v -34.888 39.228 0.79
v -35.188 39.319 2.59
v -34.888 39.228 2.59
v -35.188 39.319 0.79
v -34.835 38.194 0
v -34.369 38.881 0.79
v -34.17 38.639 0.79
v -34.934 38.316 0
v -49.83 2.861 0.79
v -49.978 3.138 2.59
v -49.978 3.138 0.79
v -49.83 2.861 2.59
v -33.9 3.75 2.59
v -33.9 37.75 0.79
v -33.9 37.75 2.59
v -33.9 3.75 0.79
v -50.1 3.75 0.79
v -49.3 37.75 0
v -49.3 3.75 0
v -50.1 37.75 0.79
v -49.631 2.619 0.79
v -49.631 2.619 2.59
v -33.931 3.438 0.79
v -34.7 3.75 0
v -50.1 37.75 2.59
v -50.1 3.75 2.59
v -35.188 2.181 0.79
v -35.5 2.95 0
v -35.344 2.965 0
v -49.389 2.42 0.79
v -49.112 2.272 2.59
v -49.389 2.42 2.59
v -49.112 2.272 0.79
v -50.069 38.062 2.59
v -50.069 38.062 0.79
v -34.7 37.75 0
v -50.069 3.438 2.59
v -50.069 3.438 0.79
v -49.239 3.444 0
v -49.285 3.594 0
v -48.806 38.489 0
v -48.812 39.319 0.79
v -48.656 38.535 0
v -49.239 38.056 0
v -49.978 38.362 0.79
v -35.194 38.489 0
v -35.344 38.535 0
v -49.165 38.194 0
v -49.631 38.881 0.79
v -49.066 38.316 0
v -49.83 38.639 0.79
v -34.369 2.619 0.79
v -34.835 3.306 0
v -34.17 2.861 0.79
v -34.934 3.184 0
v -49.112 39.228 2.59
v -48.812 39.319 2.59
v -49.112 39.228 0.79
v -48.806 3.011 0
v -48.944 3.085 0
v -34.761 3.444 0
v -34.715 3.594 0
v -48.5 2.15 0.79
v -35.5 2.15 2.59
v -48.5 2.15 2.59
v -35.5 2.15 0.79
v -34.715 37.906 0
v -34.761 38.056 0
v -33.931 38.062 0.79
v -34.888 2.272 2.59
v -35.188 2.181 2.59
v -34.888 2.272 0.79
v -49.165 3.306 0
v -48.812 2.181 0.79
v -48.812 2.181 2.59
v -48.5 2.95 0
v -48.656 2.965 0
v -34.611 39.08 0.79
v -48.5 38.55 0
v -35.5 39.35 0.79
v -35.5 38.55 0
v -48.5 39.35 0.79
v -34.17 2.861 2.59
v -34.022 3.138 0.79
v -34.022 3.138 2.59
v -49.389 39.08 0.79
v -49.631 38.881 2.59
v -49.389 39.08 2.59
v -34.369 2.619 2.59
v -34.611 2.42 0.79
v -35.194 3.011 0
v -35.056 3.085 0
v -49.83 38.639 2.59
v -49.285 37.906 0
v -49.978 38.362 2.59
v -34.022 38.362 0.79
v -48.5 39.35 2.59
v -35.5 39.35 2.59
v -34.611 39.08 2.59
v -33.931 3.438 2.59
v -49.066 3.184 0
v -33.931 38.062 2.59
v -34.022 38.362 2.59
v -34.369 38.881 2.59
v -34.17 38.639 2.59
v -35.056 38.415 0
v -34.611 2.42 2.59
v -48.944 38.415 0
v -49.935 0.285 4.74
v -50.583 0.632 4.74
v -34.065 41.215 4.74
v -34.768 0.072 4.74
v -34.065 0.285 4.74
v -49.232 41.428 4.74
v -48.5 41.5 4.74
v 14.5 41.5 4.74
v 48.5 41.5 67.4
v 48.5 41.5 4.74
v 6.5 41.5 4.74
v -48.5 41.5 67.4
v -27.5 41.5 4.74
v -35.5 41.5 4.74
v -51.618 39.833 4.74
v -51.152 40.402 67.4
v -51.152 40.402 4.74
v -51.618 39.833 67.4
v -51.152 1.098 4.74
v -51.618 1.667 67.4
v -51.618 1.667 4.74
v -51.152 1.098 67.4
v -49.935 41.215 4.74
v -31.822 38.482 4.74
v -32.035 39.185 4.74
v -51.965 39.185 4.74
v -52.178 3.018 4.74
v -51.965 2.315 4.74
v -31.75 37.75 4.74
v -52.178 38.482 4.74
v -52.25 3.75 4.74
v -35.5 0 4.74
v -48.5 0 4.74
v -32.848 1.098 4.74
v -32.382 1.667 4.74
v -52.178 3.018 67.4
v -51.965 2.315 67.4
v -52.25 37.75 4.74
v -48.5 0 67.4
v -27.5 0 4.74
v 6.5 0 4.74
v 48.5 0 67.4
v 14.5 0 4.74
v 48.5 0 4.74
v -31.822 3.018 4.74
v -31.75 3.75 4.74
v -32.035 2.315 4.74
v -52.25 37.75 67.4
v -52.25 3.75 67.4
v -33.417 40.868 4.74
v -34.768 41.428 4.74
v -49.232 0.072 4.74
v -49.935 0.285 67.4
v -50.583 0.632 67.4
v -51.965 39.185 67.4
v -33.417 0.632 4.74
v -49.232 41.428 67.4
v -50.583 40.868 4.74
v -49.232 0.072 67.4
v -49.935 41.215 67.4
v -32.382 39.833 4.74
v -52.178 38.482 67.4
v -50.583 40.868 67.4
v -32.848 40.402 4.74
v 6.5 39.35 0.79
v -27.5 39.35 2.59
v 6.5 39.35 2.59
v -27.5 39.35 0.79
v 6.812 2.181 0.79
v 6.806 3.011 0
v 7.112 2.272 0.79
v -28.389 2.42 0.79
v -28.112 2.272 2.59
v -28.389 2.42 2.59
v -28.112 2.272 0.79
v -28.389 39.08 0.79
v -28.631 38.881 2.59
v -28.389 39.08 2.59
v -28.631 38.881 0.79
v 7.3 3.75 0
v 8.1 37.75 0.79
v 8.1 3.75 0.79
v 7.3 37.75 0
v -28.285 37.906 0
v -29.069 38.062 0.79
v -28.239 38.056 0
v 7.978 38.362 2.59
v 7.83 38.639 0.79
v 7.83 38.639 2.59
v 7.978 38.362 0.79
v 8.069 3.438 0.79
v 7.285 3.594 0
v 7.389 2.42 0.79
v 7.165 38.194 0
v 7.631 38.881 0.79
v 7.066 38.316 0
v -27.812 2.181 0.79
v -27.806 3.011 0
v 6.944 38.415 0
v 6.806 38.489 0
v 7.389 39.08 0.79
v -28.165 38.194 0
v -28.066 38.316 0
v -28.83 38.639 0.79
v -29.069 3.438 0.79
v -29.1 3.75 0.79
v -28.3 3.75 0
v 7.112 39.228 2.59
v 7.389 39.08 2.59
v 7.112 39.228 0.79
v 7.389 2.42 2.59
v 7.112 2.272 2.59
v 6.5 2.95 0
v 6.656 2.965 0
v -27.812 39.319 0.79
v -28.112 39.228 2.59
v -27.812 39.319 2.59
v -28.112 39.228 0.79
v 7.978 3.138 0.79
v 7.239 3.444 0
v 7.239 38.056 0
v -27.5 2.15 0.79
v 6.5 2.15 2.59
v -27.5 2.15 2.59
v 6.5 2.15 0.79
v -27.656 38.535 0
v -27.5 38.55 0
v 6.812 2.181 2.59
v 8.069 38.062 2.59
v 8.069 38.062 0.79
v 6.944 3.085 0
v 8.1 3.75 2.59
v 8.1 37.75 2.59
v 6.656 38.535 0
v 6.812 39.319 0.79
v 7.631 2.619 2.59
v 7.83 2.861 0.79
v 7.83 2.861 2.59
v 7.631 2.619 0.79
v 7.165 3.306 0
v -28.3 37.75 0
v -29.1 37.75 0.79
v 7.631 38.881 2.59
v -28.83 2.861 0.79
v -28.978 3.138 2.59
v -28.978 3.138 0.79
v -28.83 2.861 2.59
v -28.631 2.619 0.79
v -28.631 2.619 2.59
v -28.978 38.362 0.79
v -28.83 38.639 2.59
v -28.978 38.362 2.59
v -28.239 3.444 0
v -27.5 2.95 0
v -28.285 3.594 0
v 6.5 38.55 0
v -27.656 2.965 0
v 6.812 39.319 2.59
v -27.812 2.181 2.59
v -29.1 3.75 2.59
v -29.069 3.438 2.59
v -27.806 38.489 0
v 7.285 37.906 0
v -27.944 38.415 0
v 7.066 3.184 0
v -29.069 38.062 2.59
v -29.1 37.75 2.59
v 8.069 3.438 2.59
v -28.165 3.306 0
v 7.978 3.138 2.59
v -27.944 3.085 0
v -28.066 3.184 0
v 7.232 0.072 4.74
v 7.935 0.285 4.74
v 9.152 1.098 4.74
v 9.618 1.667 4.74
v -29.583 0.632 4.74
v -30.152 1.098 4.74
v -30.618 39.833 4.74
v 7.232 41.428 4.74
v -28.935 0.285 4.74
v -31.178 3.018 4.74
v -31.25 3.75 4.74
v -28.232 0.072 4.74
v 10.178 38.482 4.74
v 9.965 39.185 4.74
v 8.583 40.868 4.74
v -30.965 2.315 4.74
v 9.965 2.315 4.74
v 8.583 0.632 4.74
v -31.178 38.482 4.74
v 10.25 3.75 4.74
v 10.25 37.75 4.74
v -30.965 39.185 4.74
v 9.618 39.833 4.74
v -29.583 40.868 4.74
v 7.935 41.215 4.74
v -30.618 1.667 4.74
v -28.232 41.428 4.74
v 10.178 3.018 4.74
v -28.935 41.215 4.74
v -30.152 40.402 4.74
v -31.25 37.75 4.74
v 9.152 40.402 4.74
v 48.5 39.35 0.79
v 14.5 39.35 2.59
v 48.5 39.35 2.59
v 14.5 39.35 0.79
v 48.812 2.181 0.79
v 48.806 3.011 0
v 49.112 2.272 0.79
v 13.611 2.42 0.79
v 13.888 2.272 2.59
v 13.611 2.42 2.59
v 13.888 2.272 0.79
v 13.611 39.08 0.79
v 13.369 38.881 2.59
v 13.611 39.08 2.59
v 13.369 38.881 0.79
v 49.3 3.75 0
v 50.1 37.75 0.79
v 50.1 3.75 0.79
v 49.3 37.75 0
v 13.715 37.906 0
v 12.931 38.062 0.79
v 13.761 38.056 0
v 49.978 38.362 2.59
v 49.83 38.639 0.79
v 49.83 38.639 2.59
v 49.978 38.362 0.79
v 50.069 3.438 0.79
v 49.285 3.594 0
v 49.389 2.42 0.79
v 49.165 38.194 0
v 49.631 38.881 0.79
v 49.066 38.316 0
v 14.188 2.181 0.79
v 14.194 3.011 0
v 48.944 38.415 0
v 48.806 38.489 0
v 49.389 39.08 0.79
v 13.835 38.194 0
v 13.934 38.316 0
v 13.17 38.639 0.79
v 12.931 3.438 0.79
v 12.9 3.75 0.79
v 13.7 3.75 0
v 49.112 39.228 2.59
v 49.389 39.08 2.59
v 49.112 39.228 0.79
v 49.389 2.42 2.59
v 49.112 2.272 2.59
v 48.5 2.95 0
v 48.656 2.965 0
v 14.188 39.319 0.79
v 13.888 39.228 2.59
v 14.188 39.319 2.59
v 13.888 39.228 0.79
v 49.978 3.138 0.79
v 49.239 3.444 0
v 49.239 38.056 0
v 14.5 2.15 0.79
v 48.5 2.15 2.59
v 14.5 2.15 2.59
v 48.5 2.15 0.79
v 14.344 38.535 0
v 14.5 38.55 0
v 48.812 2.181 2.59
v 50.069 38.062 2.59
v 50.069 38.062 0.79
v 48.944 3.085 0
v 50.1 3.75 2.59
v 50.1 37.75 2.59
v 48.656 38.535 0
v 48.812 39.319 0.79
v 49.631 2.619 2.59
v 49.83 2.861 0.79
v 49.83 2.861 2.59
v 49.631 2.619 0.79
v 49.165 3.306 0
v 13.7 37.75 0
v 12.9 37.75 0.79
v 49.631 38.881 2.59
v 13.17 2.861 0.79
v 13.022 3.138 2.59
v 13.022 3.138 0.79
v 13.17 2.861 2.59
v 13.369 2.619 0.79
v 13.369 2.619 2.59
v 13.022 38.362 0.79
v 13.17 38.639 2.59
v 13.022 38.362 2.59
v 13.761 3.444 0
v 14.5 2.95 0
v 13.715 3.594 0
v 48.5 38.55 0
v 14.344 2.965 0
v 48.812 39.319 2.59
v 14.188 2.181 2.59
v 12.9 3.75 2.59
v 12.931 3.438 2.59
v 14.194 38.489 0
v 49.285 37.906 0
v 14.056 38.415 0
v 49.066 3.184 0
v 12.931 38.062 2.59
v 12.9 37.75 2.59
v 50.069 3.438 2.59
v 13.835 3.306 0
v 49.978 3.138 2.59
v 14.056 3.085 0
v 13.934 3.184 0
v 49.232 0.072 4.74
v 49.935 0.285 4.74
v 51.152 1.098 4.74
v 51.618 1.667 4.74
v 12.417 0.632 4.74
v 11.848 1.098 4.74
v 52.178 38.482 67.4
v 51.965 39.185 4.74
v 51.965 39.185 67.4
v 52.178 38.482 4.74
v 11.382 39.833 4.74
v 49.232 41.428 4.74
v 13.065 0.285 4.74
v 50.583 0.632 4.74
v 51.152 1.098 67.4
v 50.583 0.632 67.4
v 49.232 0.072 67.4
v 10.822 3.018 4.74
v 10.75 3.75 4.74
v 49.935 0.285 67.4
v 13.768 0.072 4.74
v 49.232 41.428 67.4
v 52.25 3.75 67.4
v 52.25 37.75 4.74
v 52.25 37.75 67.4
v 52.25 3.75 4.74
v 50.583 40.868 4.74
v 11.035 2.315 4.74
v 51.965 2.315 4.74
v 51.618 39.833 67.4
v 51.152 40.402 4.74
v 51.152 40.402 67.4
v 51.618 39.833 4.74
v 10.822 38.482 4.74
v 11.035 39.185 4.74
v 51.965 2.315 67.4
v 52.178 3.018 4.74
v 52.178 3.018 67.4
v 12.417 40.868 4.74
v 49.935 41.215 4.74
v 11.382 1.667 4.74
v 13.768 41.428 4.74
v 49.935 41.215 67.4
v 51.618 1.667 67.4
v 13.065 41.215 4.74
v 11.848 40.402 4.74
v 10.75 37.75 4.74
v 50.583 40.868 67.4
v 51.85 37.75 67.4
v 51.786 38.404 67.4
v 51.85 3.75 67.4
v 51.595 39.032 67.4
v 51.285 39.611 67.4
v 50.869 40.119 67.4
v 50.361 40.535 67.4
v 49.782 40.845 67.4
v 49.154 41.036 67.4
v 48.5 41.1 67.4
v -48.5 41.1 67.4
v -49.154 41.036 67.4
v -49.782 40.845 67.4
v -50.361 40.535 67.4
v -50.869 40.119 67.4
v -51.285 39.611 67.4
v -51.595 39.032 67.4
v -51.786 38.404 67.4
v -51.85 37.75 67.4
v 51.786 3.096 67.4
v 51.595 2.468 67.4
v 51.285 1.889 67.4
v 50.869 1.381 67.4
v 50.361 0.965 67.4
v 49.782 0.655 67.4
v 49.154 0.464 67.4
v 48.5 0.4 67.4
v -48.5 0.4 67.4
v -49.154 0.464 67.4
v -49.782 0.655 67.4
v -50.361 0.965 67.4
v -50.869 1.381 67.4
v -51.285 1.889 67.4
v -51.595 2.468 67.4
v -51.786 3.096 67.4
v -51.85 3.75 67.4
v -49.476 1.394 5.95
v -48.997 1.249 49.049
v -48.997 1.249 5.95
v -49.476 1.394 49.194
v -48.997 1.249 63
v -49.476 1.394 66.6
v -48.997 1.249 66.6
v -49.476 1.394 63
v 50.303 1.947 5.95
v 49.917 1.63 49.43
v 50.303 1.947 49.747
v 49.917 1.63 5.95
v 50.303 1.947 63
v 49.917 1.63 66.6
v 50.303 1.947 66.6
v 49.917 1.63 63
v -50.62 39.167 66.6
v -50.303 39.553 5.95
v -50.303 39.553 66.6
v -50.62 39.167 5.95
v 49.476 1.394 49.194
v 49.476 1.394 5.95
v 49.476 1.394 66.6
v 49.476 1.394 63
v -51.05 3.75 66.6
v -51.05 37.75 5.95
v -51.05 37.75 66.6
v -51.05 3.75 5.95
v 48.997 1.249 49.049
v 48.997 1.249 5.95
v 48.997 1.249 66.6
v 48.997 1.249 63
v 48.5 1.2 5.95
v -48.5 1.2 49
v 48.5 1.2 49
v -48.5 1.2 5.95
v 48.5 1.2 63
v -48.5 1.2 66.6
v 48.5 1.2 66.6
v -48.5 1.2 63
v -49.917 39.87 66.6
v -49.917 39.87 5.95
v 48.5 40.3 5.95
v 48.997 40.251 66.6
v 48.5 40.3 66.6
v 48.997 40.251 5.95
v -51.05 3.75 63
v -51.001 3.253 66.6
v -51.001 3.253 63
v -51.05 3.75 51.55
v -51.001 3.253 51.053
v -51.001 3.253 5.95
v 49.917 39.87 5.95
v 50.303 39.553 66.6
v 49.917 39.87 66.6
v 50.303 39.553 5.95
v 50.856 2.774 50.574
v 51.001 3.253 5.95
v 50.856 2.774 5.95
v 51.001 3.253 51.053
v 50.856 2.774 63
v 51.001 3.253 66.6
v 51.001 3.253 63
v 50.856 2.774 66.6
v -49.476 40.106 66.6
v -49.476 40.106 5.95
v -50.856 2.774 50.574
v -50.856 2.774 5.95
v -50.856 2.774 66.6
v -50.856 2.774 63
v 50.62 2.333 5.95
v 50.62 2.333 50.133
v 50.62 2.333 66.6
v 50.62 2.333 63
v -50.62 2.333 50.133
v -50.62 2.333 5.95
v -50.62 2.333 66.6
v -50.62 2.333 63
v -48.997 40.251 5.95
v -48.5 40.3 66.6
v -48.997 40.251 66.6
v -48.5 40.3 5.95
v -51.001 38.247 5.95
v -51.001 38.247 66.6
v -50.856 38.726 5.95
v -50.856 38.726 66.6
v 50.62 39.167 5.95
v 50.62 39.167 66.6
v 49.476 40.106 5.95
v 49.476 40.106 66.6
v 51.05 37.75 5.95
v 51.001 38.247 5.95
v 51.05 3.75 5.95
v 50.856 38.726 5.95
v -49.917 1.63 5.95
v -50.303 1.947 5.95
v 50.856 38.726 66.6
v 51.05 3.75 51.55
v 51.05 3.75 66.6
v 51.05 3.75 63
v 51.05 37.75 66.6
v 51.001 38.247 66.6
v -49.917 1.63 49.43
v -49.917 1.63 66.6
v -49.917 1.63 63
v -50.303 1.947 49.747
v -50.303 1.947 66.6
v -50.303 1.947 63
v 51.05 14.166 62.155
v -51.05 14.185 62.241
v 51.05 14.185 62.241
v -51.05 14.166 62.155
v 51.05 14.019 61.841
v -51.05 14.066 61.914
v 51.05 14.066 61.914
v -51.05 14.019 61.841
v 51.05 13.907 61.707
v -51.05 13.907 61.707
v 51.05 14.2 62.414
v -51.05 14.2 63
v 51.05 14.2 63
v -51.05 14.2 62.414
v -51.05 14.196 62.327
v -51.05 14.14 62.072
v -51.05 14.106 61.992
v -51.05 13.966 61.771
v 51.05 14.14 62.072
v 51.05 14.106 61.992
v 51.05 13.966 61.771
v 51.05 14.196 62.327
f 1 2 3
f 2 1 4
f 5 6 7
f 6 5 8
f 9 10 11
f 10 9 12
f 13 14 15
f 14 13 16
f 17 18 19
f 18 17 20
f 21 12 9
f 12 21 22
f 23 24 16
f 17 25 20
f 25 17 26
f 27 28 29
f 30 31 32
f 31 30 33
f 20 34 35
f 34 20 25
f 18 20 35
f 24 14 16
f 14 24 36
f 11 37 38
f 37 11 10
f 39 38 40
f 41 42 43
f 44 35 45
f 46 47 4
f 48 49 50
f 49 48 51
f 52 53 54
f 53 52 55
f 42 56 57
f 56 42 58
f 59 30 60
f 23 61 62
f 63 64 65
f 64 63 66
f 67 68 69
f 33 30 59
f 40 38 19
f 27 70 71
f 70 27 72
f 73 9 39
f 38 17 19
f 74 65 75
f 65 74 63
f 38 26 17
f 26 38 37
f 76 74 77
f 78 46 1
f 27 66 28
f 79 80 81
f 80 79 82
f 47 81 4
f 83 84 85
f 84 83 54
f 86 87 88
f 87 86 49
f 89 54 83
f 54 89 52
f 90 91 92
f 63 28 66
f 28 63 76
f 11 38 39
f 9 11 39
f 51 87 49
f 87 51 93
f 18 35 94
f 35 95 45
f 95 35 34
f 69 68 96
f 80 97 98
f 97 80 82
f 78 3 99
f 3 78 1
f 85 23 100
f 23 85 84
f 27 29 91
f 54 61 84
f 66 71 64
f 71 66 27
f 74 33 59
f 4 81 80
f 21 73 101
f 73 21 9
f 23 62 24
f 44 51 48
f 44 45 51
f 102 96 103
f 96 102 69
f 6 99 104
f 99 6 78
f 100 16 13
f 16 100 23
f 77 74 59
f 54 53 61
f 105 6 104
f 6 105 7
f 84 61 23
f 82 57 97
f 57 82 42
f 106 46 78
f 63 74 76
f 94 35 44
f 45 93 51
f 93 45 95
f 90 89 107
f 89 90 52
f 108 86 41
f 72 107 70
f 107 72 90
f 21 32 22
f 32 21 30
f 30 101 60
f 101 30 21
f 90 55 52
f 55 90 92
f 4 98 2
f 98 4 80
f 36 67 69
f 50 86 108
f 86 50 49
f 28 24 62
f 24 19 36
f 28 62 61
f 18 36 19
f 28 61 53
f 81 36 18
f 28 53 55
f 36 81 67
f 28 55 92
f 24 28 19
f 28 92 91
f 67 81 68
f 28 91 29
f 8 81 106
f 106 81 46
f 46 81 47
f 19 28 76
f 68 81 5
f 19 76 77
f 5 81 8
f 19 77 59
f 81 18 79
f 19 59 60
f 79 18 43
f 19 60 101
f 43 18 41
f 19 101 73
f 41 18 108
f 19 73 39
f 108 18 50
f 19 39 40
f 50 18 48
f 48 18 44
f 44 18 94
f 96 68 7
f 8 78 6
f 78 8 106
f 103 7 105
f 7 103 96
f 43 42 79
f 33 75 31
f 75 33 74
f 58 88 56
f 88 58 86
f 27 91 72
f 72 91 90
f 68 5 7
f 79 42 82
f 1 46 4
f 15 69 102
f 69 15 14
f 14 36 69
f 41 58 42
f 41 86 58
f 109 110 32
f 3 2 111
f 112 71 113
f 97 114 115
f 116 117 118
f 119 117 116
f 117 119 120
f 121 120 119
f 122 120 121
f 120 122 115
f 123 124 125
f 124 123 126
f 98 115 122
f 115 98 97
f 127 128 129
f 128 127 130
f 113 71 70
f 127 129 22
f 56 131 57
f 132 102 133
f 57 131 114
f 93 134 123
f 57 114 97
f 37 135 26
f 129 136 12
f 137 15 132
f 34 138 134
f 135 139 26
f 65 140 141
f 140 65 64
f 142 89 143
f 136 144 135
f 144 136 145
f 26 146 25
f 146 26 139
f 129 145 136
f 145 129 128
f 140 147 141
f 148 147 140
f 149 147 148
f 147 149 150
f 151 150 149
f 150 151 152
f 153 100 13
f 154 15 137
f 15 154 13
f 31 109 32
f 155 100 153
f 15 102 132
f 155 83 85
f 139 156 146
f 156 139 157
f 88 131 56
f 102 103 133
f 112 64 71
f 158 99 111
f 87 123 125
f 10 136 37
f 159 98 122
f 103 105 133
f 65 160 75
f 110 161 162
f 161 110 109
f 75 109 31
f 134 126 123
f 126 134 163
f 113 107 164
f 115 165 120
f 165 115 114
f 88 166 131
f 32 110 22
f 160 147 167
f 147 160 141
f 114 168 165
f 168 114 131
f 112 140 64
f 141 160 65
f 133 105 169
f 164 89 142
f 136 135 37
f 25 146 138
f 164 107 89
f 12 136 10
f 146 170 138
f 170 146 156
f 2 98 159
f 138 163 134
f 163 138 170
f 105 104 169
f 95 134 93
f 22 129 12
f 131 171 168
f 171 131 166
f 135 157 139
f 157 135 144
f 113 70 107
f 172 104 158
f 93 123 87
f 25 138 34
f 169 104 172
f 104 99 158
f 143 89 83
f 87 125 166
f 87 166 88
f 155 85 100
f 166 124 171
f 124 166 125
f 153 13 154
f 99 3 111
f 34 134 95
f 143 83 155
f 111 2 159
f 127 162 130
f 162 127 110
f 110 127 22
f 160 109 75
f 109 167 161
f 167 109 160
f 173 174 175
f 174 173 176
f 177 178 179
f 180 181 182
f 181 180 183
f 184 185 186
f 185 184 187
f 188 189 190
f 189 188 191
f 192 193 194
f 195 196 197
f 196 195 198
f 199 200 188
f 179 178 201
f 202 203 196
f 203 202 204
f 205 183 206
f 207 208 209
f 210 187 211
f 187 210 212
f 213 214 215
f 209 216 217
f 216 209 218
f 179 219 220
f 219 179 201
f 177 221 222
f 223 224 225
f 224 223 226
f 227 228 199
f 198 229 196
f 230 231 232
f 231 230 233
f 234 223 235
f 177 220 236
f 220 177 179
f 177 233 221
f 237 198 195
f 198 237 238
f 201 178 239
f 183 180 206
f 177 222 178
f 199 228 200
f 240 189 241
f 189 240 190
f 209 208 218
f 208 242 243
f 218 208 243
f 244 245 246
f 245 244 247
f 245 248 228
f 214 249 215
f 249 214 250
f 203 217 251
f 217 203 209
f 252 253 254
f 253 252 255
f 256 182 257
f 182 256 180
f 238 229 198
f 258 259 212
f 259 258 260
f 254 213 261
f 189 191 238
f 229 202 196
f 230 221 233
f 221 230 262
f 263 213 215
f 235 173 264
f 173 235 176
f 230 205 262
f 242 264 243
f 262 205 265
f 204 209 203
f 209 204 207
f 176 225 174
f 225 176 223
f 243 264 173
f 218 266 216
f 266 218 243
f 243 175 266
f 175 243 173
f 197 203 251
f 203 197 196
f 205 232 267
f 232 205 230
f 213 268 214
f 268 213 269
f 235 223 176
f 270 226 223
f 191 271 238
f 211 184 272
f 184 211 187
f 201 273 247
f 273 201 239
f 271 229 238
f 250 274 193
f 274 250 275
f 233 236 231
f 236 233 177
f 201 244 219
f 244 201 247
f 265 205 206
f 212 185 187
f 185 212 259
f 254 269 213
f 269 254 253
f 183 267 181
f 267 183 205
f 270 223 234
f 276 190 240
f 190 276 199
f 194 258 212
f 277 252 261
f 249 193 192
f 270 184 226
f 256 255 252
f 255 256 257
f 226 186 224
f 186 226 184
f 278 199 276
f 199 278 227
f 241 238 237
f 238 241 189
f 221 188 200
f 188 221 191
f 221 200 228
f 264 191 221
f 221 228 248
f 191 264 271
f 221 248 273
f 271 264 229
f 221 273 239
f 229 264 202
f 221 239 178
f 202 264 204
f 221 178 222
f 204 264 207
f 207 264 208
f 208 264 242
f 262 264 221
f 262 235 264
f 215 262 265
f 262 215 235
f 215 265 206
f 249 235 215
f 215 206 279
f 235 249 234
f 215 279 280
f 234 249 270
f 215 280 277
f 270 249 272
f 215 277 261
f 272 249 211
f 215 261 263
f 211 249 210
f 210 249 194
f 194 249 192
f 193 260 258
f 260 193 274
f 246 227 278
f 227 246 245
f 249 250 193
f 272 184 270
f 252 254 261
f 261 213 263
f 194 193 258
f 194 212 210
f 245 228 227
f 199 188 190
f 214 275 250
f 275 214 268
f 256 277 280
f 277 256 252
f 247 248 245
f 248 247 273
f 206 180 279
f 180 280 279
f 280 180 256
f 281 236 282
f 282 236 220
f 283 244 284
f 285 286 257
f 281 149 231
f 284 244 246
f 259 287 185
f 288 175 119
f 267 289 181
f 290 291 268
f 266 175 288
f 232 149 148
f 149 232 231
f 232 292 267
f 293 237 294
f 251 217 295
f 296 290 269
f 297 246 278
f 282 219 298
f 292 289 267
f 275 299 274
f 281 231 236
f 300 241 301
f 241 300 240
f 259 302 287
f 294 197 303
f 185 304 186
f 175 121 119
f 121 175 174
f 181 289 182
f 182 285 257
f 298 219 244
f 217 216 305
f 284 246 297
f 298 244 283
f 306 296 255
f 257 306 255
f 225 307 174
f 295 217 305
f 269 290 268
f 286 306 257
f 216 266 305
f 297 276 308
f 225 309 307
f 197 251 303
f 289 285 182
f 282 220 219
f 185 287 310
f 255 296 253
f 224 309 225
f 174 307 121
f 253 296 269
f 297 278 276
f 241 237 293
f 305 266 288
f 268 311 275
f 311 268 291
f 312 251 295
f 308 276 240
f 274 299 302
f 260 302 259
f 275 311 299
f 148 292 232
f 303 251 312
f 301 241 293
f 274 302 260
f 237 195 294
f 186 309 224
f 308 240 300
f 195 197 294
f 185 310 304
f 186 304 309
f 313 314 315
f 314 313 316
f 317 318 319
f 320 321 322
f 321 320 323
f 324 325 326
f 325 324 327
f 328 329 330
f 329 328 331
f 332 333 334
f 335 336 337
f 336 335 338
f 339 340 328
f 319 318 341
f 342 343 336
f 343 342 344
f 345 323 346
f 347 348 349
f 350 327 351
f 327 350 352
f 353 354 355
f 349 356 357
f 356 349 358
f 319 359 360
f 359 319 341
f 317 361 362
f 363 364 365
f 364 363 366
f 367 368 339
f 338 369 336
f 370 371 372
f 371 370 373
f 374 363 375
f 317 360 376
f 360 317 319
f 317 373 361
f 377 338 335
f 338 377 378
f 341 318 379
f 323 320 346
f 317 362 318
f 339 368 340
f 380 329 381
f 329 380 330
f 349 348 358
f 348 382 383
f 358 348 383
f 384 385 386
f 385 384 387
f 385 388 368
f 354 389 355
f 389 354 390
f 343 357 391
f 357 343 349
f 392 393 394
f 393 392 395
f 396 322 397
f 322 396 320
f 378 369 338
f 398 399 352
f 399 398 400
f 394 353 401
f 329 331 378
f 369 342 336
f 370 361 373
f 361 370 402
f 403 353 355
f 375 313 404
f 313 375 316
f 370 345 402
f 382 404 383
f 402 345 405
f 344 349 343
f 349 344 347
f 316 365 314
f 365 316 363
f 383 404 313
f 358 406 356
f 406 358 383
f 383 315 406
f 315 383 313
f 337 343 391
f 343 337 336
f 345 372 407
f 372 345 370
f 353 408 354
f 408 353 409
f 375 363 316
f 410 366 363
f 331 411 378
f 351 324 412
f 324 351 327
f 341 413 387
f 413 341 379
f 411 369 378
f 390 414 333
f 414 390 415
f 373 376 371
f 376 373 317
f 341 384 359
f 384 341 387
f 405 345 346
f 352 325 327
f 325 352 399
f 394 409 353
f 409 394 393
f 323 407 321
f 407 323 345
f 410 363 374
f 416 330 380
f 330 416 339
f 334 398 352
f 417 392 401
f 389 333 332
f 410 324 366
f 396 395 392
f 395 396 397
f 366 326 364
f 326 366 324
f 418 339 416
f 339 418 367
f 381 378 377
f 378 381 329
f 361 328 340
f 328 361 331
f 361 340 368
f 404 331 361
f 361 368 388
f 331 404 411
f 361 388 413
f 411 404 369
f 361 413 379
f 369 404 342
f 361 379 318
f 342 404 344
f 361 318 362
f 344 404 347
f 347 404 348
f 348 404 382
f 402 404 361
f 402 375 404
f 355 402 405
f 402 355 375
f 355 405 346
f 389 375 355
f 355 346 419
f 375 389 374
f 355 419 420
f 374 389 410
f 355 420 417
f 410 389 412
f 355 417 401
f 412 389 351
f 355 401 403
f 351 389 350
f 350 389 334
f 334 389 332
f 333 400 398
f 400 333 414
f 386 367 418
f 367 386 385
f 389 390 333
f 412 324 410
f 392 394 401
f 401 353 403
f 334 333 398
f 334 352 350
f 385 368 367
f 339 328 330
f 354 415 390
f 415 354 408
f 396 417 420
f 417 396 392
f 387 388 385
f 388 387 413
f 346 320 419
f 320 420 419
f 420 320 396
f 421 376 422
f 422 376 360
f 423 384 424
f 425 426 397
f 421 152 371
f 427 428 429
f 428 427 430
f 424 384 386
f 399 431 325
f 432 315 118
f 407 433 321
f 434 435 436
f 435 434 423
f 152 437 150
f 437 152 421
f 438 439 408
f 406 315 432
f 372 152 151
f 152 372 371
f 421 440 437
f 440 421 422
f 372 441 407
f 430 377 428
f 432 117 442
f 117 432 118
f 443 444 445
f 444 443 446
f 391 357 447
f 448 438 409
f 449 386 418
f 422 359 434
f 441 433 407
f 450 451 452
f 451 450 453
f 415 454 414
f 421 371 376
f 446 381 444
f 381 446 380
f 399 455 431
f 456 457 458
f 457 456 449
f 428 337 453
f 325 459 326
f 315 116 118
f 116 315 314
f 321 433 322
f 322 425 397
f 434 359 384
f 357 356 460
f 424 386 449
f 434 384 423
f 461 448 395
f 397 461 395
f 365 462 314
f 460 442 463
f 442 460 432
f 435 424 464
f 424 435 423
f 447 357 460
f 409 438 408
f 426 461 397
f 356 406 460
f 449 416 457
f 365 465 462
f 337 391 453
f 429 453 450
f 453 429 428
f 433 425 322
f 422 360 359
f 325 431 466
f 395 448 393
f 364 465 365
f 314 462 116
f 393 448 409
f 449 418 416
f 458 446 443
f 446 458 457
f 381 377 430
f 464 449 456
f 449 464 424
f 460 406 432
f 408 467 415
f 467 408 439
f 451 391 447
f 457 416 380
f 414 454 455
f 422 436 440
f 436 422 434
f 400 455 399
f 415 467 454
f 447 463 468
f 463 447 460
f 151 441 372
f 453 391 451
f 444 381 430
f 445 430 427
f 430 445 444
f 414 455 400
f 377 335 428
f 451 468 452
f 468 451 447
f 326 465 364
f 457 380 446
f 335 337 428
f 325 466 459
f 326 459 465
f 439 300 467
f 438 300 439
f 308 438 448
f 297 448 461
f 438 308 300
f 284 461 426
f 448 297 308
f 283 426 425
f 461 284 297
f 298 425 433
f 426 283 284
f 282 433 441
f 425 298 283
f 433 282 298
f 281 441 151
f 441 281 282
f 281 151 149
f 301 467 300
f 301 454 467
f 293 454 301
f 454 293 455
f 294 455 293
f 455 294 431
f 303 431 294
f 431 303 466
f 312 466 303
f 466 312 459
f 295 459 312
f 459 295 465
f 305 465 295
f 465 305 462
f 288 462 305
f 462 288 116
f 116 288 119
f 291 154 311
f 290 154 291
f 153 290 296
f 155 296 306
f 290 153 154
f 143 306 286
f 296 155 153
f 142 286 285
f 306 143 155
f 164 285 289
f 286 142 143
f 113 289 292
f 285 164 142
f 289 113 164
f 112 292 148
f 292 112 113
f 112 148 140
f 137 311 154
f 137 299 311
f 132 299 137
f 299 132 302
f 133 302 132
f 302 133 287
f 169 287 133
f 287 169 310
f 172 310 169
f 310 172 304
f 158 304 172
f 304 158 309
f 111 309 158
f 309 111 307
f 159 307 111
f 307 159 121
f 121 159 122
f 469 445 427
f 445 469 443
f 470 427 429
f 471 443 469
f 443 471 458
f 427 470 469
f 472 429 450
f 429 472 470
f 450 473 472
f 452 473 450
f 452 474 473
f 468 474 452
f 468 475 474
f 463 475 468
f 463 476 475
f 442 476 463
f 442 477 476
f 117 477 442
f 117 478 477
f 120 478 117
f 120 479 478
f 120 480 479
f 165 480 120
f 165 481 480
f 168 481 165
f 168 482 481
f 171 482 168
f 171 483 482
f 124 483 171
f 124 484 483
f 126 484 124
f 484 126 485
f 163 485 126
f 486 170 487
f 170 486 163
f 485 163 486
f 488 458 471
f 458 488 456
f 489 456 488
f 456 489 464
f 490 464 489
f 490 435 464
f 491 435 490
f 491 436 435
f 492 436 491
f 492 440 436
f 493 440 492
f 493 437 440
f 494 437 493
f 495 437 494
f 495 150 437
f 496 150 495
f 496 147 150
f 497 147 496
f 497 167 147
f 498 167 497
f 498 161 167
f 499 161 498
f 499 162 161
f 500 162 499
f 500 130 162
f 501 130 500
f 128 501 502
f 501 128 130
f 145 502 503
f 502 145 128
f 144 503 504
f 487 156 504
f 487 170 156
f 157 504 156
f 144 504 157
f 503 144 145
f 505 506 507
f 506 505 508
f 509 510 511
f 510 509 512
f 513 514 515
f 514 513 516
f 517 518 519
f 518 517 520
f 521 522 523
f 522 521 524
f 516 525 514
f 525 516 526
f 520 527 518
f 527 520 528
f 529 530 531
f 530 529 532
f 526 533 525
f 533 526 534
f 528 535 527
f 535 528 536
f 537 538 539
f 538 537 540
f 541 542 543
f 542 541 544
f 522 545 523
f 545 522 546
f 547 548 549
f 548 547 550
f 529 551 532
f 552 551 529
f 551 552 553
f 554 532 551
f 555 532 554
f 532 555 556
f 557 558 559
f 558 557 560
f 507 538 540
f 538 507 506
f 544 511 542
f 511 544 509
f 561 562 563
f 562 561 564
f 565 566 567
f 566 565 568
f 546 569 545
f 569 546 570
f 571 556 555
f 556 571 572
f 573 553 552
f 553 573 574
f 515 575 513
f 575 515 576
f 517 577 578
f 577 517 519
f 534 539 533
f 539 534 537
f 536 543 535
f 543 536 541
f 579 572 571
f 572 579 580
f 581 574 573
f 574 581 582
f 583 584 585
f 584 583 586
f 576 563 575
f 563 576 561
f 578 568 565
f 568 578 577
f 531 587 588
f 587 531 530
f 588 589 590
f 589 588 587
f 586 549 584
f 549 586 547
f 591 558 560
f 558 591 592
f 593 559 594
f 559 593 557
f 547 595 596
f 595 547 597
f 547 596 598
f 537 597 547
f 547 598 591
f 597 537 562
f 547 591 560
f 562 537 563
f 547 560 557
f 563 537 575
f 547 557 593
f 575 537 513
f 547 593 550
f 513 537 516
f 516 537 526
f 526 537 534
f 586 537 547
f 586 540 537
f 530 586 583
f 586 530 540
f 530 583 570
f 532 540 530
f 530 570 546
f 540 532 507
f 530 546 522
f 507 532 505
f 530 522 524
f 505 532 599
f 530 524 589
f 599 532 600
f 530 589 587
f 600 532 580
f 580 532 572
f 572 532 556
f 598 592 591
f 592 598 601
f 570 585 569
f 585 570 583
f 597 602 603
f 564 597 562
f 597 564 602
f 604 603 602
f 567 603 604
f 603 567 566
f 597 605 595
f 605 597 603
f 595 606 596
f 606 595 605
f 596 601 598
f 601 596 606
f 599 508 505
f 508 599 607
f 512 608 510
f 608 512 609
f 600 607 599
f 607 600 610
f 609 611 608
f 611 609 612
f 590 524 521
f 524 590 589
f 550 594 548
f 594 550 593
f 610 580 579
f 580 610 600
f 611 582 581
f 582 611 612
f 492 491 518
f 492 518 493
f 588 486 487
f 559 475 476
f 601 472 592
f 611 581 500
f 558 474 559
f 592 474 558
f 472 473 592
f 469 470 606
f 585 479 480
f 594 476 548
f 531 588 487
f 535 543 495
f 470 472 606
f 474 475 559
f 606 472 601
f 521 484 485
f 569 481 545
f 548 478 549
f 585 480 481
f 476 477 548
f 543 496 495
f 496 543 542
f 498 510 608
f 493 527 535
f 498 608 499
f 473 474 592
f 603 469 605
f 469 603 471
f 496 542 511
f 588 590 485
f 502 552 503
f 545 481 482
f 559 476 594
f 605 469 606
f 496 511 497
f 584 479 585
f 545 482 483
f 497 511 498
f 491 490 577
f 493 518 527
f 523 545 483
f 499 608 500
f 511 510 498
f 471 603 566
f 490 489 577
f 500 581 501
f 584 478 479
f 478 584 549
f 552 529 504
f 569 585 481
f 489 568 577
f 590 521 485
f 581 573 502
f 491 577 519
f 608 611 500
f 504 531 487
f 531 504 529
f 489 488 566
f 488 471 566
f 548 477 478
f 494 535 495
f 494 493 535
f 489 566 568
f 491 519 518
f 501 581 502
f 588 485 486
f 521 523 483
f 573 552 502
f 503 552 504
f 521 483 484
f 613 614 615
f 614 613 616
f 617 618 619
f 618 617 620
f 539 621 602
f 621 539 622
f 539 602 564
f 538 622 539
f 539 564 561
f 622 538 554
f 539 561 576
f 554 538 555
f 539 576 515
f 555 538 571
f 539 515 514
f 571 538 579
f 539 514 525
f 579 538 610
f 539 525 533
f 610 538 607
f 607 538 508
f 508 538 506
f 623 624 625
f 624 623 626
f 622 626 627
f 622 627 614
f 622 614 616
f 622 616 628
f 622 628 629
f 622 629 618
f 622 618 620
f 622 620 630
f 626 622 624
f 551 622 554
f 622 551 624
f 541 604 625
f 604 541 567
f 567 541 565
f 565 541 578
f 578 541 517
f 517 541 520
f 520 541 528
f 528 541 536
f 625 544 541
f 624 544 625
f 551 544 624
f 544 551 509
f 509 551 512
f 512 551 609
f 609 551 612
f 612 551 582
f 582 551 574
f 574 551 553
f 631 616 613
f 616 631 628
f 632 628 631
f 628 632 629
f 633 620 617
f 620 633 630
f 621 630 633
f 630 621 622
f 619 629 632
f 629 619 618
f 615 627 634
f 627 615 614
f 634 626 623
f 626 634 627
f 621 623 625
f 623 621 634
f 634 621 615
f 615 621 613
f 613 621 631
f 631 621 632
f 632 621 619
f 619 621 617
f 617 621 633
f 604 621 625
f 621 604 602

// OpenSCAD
// file: ../../../modules/gridfinity.scad
// Gridfinity ベースプレートの共有 module。
// 寸法は Gridfinity 仕様 (Zack Freedman) の baseplate 輪郭に従う:
//   ピッチ 42、ソケット上端開口 41.5 (角 R4)、上から 45° 面取り 2.15 →
//   垂直 1.8 (37.2 角・R1.85) → 45° 面取り 0.7 → 底 35.8 角 (R1.15)。
//   ソケット深さ = 2.15 + 1.8 + 0.7 = 4.65。
//
// 座標系: X が列方向 (中央が 0)、Y が行方向 (板の前端が 0)、Z=0 が板の底面。
// 板の外形は grid とは独立に rim で与えるので、grid より大きい板 (縁付き) を
// 作れる。ソケットは rim=[left, right, front, back] の内側へ 42 ピッチで並ぶ。

gf_pitch = 42;
gf_socket_top = 41.5; // 上端開口
gf_socket_mid = 37.2; // 垂直部
gf_socket_bot = 35.8; // 底
gf_socket_r_top = 4;
gf_socket_r_mid = 1.85;
gf_socket_r_bot = 1.15;
gf_chamfer_top = 2.15;
gf_wall_h = 1.8;
gf_chamfer_bot = 0.7;
gf_socket_depth = gf_chamfer_top + gf_wall_h + gf_chamfer_bot; // 4.65
gf_fn = 32;
gf_eps = 0.01; // hull 用の薄板の厚さ
gf_over = 0.5; // 切削の抜き代

// 角丸正方形または矩形 (w は一辺、または [幅, 奥行き]、角 R)
module
gf_rounded_square(w, r)
{
    offset(r = r, $fn = gf_fn)
        square(is_list(w) ? w - [ 2 * r, 2 * r ] : w - 2 * r, center = true);
}

// 厚さ gf_eps の角丸正方形の薄板を z に置く (hull の骨)
module
gf_slab(w, r, z)
{
    translate([ 0, 0, z ]) linear_extrude(gf_eps) gf_rounded_square(w, r);
}

// ソケット1個の切削体。z=0 がソケットの底 (床の天面)、+Z へ 4.65 で天面に出る。
// clearance は嵌合の逃げで、輪郭を全周へ clearance だけ外へ出す (幅 +2c、角 R
// +c)。pitch_x は X 方向のセル幅。端数でも角 R と面取りの寸法を保つ。
module
gf_socket_cut(clearance = 0, pitch_x = gf_pitch)
{
    z1 = gf_chamfer_bot;
    z2 = z1 + gf_wall_h;
    z3 = gf_socket_depth;
    c = clearance;
    assert(pitch_x > gf_pitch - gf_socket_top + 2 * gf_socket_r_top,
           "Cell width is too small for the socket corner radius");
    delta = [ pitch_x - gf_pitch, 0 ];
    bot = [ gf_socket_bot + 2 * c, gf_socket_bot + 2 * c ] + delta;
    mid = [ gf_socket_mid + 2 * c, gf_socket_mid + 2 * c ] + delta;
    top = [ gf_socket_top + 2 * c, gf_socket_top + 2 * c ] + delta;
    hull()
    {
        gf_slab(bot, gf_socket_r_bot + c, 0);
        gf_slab(mid, gf_socket_r_mid + c, z1 - gf_eps);
    }
    hull()
    {
        gf_slab(mid, gf_socket_r_mid + c, z1 - gf_eps);
        gf_slab(mid, gf_socket_r_mid + c, z2 - gf_eps);
    }
    hull()
    {
        gf_slab(mid, gf_socket_r_mid + c, z2 - gf_eps);
        gf_slab(top, gf_socket_r_top + c, z3 - gf_eps);
    }
    // 天面より上へ抜く (天面と同一平面の退化した面を残さない)
    gf_slab(top, gf_socket_r_top + c, z3 - gf_eps);
    translate([ 0, 0, z3 - gf_eps ]) linear_extrude(gf_over + gf_eps)
        gf_rounded_square(top, gf_socket_r_top + c);
}

// ベースプレート。cols x rows のソケットを床 floor_t の上に彫る。
// rim = [left, right, front, back] はソケット列の外側に残す縁の幅。
// 板の幅 = cols*42 + left + right、奥行き = rows*42 + front + back。
// cols の端数は左端の細幅セルになる。rows は正の整数。
// clearance はソケットの嵌合の逃げ (gf_socket_cut を参照)。
module
gf_baseplate(cols, rows, rim = [ 0, 0, 0, 0 ], floor_t = 1, clearance = 0)
{
    grid_w = cols * gf_pitch;
    grid_d = rows * gf_pitch;
    plate_w = grid_w + rim[0] + rim[1];
    plate_d = grid_d + rim[2] + rim[3];
    x0 = -plate_w / 2 + rim[0]; // ソケット列の左端
    first_pitch = grid_w - (ceil(cols) - 1) * gf_pitch;
    difference()
    {
        translate([ -plate_w / 2, 0, 0 ])
            cube([ plate_w, plate_d, floor_t + gf_socket_depth ]);
        for (c = [0:ceil(cols) - 1], r = [0:rows - 1])
            translate([
                x0 + (c == 0 ? first_pitch / 2
                             : first_pitch + (c - 0.5) * gf_pitch),
                rim[2] + (r + 0.5) * gf_pitch,
                floor_t
            ]) gf_socket_cut(clearance, c == 0 ? first_pitch : gf_pitch);
    }
}
// file: ../../../modules/gridfinity_bins.scad
include <gridfinity_bin.scad>

// assets/gridfinity-bin/ の bin 群の共通値と、サイズ 3 引数の払い出し口。
// 単体では何も描かない。設計の経緯と確定値は
// ledger/designs/gridfinity-bin-4u.md が正本。
// 通常binは4U/9U、X={1,1.5,2,2.5,3} × Y={1,2,3,4,5,5.5}。
// 両軸に端数を持つ組み合わせはassetに置かない（各高さ28種）。
// Xが横、Yがラベルの壁から奥、unitsが高さ（7mm単位）。
wall = 1.2;    // 0.4 ノズル 3 本
floor_t = 1.2; // 底 (4.75) の上に載せる床。床の天面 z = 5.95
label_d = 13;  // 12mm 幅のラベルシールを貼る天板の張り出し
label_t = 1; // 天板の厚さ (user 指定)。下は 45° の無垢のくさび
label_r = 1; // 天板の先端と 45° 面の境目の R (user 指定)
// カードケース (goods/card_case_2x3x4u.scad) の値。カードは ISO/IEC 7810 ID-1 (85.6 × 54 ×
// 0.76、隅 R3) で、長辺を Y (rows 方向) に寝かせ、X 中央・手前の壁から 10 奥に置く。ポケットは
// カードより 1 大きい (片側 0.5)。右奥のマスは壁の内面まで抜き、床と底を外形に平行な 45° の窪みにする。
// ポケットの左右の埋めの天面 (幅 13.05) が 12mm のラベルを貼る帯。ポケットと穴の交点の
// 縦エッジは丸める (開口の上縁は丸めない: 壁を上端まで垂直に保ち、収まる枚数を減らさない)
card_w = 54;    // カードの短辺 (X)。user 指定「高さ 54」
card_d = 85.6;  // カードの長辺 (Y)。user 指定「幅 85.6」
card_clear = 1; // ポケットの余裕 (user 指定「+1mm」)
// ポケットの手前の辺の、手前の壁の内面からの距離 (user 指定「10mm」)
card_off = 10;
// ポケットの平面の隅 R (user 指定「角の丸み 3mm」。ID-1 の隅は 2.88..3.48)
card_r = 3;
// ポケットと穴が交わる所の、埋めの凸の縦エッジの R (指の当たる角)
card_edge_r = 2;
recess_skin = floor_t + 1.75; // 窪みの床 z (底の皮)。user 指定「壁厚と同じ 1.2 は過剰、1.75 返す」

function bin_contract(cols, rows, units) = str("CONTRACT units=",
                                               units,
                                               " pitch=",
                                               gf_pitch,
                                               " outer=",
                                               gfb_outer,
                                               " h=",
                                               units* gfb_unit,
                                               " lip=",
                                               gfb_lip_h,
                                               " base=",
                                               gfb_base_bot,
                                               "/",
                                               gfb_base_mid,
                                               "/",
                                               gfb_outer,
                                               " base_h=",
                                               gfb_base_h,
                                               " wall=",
                                               wall,
                                               " floor_top=",
                                               gfb_base_h + floor_t,
                                               " label=",
                                               label_d,
                                               "x",
                                               label_t,
                                               " wedge=45 fillet=",
                                               label_r,
                                               " bin=",
                                               cols,
                                               "x",
                                               rows,
                                               " size=",
                                               cols* gf_pitch - 0.5,
                                               "x",
                                               rows* gf_pitch - 0.5);

// (cols, rows, units) でラベル付き bin を払い出す。例: gridfinity_bin(2, 4, 4)
module
gridfinity_bin(cols, rows, units = 4)
{
    echo(bin_contract(cols, rows, units));
    gfb_bin(cols, rows, units, wall, floor_t, label_d, label_t, label_r);
}

function card_contract(cols, rows, units) = str("CONTRACT card units=",
                                                units,
                                                " bin=",
                                                cols,
                                                "x",
                                                rows,
                                                " size=",
                                                cols* gf_pitch - 0.5,
                                                "x",
                                                rows* gf_pitch - 0.5,
                                                " h=",
                                                units* gfb_unit,
                                                " lip=",
                                                gfb_lip_h,
                                                " floor_top=",
                                                gfb_base_h + floor_t,
                                                " card=",
                                                card_w,
                                                "x",
                                                card_d,
                                                " pocket=",
                                                card_w + card_clear,
                                                "x",
                                                card_d + card_clear,
                                                " at=",
                                                -(card_w + card_clear) / 2,
                                                ",",
                                                wall + card_off,
                                                " hole=",
                                                (cols - 1) / 2 * gf_pitch - gfb_outer / 2,
                                                ",",
                                                (rows - 0.5) * gf_pitch - 0.25 - gfb_outer / 2,
                                                " hole_r=",
                                                gfb_outer_r - wall,
                                                " recess=",
                                                gfb_outer - 2 * wall,
                                                "/",
                                                gfb_base_mid - 2 * wall,
                                                " recess_floor=",
                                                recess_skin,
                                                " r=",
                                                card_r,
                                                " edge_r=",
                                                card_edge_r);

// (cols, rows, units) でカードケースを払い出す。例: gridfinity_card_case(2, 3, 4)
module
gridfinity_card_case(cols, rows, units = 4)
{
    echo(card_contract(cols, rows, units));
    gfb_card_case(cols,
                  rows,
                  units,
                  wall,
                  floor_t,
                  [ card_w, card_d ],
                  card_clear,
                  card_off,
                  card_r,
                  recess_skin,
                  card_edge_r);
}
// main file
include <../../../modules/gridfinity_bins.scad>

gridfinity_bin(2.5, 1, 9);
